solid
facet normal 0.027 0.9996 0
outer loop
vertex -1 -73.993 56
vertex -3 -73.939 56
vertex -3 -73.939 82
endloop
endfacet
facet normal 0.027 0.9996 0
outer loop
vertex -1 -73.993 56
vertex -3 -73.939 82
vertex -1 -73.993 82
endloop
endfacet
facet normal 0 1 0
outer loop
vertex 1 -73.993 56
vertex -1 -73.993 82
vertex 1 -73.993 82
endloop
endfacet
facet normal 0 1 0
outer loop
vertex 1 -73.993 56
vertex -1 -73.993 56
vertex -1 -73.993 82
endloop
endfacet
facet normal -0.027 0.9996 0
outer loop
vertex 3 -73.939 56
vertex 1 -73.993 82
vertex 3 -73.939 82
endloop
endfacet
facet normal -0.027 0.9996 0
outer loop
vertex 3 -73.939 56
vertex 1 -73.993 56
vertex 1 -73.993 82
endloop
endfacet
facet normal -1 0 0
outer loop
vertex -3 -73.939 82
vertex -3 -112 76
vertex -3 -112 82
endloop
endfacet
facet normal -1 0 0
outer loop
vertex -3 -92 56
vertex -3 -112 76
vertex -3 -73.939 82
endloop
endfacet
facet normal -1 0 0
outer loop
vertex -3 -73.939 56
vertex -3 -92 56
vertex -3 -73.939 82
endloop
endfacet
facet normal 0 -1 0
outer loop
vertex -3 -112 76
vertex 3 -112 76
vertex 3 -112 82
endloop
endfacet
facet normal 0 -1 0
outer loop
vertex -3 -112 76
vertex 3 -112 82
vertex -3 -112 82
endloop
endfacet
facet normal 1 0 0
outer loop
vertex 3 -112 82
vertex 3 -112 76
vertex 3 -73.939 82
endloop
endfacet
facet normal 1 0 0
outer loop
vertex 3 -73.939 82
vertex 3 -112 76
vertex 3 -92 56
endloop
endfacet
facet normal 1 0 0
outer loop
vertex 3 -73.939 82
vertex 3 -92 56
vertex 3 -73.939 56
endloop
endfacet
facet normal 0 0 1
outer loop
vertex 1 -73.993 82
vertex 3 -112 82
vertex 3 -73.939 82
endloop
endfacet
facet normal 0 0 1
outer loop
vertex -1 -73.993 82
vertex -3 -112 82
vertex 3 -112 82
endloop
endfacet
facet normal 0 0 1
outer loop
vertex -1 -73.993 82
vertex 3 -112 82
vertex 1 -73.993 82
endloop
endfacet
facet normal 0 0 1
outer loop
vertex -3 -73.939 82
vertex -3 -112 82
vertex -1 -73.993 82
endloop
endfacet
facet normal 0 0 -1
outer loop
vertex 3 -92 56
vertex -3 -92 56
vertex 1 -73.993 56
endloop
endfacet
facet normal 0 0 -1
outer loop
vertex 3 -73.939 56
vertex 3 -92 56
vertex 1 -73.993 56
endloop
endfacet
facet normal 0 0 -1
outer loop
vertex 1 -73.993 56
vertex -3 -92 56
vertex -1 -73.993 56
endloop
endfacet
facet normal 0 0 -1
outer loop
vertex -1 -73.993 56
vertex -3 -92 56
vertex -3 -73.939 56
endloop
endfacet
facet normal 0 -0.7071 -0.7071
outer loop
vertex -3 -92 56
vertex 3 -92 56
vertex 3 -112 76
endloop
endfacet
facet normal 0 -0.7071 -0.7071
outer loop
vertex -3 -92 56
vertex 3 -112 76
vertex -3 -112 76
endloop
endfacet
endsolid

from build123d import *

# Parameters (mm, degrees)
CYLINDER969_R     = 74
CYLINDER969_DEPTH = 40
BOX480_W          = 50
BOX480_H          = 6
BOX480_DEPTH      = 26
CHAMFER011_SIZE   = 20


with BuildPart() as v_lec969:
    # Cylinder969 → Cylinder969 (new body)
    with BuildSketch(Plane.XY.offset(42)):
        Circle(CYLINDER969_R)
    extrude(amount=CYLINDER969_DEPTH)


with BuildPart() as chamfer011:
    # Box480 → Box480 (new body)
    with BuildSketch(Plane(origin=(3, -112, 56), x_dir=(0, 1, 0), z_dir=(0, 0, 1))):
        with Locations((25, 3)):
            Rectangle(BOX480_W, BOX480_H)
    extrude(amount=BOX480_DEPTH)

    # Cut449: cut Válec969
    add(v_lec969.part, mode=Mode.SUBTRACT)

    # Chamfer011
    chamfer011_edges = [chamfer011.edges().sort_by_distance(p)[0] for p in [
        (0, -112, 56),
    ]]
    chamfer(chamfer011_edges, length=CHAMFER011_SIZE)


solid = chamfer011.part
